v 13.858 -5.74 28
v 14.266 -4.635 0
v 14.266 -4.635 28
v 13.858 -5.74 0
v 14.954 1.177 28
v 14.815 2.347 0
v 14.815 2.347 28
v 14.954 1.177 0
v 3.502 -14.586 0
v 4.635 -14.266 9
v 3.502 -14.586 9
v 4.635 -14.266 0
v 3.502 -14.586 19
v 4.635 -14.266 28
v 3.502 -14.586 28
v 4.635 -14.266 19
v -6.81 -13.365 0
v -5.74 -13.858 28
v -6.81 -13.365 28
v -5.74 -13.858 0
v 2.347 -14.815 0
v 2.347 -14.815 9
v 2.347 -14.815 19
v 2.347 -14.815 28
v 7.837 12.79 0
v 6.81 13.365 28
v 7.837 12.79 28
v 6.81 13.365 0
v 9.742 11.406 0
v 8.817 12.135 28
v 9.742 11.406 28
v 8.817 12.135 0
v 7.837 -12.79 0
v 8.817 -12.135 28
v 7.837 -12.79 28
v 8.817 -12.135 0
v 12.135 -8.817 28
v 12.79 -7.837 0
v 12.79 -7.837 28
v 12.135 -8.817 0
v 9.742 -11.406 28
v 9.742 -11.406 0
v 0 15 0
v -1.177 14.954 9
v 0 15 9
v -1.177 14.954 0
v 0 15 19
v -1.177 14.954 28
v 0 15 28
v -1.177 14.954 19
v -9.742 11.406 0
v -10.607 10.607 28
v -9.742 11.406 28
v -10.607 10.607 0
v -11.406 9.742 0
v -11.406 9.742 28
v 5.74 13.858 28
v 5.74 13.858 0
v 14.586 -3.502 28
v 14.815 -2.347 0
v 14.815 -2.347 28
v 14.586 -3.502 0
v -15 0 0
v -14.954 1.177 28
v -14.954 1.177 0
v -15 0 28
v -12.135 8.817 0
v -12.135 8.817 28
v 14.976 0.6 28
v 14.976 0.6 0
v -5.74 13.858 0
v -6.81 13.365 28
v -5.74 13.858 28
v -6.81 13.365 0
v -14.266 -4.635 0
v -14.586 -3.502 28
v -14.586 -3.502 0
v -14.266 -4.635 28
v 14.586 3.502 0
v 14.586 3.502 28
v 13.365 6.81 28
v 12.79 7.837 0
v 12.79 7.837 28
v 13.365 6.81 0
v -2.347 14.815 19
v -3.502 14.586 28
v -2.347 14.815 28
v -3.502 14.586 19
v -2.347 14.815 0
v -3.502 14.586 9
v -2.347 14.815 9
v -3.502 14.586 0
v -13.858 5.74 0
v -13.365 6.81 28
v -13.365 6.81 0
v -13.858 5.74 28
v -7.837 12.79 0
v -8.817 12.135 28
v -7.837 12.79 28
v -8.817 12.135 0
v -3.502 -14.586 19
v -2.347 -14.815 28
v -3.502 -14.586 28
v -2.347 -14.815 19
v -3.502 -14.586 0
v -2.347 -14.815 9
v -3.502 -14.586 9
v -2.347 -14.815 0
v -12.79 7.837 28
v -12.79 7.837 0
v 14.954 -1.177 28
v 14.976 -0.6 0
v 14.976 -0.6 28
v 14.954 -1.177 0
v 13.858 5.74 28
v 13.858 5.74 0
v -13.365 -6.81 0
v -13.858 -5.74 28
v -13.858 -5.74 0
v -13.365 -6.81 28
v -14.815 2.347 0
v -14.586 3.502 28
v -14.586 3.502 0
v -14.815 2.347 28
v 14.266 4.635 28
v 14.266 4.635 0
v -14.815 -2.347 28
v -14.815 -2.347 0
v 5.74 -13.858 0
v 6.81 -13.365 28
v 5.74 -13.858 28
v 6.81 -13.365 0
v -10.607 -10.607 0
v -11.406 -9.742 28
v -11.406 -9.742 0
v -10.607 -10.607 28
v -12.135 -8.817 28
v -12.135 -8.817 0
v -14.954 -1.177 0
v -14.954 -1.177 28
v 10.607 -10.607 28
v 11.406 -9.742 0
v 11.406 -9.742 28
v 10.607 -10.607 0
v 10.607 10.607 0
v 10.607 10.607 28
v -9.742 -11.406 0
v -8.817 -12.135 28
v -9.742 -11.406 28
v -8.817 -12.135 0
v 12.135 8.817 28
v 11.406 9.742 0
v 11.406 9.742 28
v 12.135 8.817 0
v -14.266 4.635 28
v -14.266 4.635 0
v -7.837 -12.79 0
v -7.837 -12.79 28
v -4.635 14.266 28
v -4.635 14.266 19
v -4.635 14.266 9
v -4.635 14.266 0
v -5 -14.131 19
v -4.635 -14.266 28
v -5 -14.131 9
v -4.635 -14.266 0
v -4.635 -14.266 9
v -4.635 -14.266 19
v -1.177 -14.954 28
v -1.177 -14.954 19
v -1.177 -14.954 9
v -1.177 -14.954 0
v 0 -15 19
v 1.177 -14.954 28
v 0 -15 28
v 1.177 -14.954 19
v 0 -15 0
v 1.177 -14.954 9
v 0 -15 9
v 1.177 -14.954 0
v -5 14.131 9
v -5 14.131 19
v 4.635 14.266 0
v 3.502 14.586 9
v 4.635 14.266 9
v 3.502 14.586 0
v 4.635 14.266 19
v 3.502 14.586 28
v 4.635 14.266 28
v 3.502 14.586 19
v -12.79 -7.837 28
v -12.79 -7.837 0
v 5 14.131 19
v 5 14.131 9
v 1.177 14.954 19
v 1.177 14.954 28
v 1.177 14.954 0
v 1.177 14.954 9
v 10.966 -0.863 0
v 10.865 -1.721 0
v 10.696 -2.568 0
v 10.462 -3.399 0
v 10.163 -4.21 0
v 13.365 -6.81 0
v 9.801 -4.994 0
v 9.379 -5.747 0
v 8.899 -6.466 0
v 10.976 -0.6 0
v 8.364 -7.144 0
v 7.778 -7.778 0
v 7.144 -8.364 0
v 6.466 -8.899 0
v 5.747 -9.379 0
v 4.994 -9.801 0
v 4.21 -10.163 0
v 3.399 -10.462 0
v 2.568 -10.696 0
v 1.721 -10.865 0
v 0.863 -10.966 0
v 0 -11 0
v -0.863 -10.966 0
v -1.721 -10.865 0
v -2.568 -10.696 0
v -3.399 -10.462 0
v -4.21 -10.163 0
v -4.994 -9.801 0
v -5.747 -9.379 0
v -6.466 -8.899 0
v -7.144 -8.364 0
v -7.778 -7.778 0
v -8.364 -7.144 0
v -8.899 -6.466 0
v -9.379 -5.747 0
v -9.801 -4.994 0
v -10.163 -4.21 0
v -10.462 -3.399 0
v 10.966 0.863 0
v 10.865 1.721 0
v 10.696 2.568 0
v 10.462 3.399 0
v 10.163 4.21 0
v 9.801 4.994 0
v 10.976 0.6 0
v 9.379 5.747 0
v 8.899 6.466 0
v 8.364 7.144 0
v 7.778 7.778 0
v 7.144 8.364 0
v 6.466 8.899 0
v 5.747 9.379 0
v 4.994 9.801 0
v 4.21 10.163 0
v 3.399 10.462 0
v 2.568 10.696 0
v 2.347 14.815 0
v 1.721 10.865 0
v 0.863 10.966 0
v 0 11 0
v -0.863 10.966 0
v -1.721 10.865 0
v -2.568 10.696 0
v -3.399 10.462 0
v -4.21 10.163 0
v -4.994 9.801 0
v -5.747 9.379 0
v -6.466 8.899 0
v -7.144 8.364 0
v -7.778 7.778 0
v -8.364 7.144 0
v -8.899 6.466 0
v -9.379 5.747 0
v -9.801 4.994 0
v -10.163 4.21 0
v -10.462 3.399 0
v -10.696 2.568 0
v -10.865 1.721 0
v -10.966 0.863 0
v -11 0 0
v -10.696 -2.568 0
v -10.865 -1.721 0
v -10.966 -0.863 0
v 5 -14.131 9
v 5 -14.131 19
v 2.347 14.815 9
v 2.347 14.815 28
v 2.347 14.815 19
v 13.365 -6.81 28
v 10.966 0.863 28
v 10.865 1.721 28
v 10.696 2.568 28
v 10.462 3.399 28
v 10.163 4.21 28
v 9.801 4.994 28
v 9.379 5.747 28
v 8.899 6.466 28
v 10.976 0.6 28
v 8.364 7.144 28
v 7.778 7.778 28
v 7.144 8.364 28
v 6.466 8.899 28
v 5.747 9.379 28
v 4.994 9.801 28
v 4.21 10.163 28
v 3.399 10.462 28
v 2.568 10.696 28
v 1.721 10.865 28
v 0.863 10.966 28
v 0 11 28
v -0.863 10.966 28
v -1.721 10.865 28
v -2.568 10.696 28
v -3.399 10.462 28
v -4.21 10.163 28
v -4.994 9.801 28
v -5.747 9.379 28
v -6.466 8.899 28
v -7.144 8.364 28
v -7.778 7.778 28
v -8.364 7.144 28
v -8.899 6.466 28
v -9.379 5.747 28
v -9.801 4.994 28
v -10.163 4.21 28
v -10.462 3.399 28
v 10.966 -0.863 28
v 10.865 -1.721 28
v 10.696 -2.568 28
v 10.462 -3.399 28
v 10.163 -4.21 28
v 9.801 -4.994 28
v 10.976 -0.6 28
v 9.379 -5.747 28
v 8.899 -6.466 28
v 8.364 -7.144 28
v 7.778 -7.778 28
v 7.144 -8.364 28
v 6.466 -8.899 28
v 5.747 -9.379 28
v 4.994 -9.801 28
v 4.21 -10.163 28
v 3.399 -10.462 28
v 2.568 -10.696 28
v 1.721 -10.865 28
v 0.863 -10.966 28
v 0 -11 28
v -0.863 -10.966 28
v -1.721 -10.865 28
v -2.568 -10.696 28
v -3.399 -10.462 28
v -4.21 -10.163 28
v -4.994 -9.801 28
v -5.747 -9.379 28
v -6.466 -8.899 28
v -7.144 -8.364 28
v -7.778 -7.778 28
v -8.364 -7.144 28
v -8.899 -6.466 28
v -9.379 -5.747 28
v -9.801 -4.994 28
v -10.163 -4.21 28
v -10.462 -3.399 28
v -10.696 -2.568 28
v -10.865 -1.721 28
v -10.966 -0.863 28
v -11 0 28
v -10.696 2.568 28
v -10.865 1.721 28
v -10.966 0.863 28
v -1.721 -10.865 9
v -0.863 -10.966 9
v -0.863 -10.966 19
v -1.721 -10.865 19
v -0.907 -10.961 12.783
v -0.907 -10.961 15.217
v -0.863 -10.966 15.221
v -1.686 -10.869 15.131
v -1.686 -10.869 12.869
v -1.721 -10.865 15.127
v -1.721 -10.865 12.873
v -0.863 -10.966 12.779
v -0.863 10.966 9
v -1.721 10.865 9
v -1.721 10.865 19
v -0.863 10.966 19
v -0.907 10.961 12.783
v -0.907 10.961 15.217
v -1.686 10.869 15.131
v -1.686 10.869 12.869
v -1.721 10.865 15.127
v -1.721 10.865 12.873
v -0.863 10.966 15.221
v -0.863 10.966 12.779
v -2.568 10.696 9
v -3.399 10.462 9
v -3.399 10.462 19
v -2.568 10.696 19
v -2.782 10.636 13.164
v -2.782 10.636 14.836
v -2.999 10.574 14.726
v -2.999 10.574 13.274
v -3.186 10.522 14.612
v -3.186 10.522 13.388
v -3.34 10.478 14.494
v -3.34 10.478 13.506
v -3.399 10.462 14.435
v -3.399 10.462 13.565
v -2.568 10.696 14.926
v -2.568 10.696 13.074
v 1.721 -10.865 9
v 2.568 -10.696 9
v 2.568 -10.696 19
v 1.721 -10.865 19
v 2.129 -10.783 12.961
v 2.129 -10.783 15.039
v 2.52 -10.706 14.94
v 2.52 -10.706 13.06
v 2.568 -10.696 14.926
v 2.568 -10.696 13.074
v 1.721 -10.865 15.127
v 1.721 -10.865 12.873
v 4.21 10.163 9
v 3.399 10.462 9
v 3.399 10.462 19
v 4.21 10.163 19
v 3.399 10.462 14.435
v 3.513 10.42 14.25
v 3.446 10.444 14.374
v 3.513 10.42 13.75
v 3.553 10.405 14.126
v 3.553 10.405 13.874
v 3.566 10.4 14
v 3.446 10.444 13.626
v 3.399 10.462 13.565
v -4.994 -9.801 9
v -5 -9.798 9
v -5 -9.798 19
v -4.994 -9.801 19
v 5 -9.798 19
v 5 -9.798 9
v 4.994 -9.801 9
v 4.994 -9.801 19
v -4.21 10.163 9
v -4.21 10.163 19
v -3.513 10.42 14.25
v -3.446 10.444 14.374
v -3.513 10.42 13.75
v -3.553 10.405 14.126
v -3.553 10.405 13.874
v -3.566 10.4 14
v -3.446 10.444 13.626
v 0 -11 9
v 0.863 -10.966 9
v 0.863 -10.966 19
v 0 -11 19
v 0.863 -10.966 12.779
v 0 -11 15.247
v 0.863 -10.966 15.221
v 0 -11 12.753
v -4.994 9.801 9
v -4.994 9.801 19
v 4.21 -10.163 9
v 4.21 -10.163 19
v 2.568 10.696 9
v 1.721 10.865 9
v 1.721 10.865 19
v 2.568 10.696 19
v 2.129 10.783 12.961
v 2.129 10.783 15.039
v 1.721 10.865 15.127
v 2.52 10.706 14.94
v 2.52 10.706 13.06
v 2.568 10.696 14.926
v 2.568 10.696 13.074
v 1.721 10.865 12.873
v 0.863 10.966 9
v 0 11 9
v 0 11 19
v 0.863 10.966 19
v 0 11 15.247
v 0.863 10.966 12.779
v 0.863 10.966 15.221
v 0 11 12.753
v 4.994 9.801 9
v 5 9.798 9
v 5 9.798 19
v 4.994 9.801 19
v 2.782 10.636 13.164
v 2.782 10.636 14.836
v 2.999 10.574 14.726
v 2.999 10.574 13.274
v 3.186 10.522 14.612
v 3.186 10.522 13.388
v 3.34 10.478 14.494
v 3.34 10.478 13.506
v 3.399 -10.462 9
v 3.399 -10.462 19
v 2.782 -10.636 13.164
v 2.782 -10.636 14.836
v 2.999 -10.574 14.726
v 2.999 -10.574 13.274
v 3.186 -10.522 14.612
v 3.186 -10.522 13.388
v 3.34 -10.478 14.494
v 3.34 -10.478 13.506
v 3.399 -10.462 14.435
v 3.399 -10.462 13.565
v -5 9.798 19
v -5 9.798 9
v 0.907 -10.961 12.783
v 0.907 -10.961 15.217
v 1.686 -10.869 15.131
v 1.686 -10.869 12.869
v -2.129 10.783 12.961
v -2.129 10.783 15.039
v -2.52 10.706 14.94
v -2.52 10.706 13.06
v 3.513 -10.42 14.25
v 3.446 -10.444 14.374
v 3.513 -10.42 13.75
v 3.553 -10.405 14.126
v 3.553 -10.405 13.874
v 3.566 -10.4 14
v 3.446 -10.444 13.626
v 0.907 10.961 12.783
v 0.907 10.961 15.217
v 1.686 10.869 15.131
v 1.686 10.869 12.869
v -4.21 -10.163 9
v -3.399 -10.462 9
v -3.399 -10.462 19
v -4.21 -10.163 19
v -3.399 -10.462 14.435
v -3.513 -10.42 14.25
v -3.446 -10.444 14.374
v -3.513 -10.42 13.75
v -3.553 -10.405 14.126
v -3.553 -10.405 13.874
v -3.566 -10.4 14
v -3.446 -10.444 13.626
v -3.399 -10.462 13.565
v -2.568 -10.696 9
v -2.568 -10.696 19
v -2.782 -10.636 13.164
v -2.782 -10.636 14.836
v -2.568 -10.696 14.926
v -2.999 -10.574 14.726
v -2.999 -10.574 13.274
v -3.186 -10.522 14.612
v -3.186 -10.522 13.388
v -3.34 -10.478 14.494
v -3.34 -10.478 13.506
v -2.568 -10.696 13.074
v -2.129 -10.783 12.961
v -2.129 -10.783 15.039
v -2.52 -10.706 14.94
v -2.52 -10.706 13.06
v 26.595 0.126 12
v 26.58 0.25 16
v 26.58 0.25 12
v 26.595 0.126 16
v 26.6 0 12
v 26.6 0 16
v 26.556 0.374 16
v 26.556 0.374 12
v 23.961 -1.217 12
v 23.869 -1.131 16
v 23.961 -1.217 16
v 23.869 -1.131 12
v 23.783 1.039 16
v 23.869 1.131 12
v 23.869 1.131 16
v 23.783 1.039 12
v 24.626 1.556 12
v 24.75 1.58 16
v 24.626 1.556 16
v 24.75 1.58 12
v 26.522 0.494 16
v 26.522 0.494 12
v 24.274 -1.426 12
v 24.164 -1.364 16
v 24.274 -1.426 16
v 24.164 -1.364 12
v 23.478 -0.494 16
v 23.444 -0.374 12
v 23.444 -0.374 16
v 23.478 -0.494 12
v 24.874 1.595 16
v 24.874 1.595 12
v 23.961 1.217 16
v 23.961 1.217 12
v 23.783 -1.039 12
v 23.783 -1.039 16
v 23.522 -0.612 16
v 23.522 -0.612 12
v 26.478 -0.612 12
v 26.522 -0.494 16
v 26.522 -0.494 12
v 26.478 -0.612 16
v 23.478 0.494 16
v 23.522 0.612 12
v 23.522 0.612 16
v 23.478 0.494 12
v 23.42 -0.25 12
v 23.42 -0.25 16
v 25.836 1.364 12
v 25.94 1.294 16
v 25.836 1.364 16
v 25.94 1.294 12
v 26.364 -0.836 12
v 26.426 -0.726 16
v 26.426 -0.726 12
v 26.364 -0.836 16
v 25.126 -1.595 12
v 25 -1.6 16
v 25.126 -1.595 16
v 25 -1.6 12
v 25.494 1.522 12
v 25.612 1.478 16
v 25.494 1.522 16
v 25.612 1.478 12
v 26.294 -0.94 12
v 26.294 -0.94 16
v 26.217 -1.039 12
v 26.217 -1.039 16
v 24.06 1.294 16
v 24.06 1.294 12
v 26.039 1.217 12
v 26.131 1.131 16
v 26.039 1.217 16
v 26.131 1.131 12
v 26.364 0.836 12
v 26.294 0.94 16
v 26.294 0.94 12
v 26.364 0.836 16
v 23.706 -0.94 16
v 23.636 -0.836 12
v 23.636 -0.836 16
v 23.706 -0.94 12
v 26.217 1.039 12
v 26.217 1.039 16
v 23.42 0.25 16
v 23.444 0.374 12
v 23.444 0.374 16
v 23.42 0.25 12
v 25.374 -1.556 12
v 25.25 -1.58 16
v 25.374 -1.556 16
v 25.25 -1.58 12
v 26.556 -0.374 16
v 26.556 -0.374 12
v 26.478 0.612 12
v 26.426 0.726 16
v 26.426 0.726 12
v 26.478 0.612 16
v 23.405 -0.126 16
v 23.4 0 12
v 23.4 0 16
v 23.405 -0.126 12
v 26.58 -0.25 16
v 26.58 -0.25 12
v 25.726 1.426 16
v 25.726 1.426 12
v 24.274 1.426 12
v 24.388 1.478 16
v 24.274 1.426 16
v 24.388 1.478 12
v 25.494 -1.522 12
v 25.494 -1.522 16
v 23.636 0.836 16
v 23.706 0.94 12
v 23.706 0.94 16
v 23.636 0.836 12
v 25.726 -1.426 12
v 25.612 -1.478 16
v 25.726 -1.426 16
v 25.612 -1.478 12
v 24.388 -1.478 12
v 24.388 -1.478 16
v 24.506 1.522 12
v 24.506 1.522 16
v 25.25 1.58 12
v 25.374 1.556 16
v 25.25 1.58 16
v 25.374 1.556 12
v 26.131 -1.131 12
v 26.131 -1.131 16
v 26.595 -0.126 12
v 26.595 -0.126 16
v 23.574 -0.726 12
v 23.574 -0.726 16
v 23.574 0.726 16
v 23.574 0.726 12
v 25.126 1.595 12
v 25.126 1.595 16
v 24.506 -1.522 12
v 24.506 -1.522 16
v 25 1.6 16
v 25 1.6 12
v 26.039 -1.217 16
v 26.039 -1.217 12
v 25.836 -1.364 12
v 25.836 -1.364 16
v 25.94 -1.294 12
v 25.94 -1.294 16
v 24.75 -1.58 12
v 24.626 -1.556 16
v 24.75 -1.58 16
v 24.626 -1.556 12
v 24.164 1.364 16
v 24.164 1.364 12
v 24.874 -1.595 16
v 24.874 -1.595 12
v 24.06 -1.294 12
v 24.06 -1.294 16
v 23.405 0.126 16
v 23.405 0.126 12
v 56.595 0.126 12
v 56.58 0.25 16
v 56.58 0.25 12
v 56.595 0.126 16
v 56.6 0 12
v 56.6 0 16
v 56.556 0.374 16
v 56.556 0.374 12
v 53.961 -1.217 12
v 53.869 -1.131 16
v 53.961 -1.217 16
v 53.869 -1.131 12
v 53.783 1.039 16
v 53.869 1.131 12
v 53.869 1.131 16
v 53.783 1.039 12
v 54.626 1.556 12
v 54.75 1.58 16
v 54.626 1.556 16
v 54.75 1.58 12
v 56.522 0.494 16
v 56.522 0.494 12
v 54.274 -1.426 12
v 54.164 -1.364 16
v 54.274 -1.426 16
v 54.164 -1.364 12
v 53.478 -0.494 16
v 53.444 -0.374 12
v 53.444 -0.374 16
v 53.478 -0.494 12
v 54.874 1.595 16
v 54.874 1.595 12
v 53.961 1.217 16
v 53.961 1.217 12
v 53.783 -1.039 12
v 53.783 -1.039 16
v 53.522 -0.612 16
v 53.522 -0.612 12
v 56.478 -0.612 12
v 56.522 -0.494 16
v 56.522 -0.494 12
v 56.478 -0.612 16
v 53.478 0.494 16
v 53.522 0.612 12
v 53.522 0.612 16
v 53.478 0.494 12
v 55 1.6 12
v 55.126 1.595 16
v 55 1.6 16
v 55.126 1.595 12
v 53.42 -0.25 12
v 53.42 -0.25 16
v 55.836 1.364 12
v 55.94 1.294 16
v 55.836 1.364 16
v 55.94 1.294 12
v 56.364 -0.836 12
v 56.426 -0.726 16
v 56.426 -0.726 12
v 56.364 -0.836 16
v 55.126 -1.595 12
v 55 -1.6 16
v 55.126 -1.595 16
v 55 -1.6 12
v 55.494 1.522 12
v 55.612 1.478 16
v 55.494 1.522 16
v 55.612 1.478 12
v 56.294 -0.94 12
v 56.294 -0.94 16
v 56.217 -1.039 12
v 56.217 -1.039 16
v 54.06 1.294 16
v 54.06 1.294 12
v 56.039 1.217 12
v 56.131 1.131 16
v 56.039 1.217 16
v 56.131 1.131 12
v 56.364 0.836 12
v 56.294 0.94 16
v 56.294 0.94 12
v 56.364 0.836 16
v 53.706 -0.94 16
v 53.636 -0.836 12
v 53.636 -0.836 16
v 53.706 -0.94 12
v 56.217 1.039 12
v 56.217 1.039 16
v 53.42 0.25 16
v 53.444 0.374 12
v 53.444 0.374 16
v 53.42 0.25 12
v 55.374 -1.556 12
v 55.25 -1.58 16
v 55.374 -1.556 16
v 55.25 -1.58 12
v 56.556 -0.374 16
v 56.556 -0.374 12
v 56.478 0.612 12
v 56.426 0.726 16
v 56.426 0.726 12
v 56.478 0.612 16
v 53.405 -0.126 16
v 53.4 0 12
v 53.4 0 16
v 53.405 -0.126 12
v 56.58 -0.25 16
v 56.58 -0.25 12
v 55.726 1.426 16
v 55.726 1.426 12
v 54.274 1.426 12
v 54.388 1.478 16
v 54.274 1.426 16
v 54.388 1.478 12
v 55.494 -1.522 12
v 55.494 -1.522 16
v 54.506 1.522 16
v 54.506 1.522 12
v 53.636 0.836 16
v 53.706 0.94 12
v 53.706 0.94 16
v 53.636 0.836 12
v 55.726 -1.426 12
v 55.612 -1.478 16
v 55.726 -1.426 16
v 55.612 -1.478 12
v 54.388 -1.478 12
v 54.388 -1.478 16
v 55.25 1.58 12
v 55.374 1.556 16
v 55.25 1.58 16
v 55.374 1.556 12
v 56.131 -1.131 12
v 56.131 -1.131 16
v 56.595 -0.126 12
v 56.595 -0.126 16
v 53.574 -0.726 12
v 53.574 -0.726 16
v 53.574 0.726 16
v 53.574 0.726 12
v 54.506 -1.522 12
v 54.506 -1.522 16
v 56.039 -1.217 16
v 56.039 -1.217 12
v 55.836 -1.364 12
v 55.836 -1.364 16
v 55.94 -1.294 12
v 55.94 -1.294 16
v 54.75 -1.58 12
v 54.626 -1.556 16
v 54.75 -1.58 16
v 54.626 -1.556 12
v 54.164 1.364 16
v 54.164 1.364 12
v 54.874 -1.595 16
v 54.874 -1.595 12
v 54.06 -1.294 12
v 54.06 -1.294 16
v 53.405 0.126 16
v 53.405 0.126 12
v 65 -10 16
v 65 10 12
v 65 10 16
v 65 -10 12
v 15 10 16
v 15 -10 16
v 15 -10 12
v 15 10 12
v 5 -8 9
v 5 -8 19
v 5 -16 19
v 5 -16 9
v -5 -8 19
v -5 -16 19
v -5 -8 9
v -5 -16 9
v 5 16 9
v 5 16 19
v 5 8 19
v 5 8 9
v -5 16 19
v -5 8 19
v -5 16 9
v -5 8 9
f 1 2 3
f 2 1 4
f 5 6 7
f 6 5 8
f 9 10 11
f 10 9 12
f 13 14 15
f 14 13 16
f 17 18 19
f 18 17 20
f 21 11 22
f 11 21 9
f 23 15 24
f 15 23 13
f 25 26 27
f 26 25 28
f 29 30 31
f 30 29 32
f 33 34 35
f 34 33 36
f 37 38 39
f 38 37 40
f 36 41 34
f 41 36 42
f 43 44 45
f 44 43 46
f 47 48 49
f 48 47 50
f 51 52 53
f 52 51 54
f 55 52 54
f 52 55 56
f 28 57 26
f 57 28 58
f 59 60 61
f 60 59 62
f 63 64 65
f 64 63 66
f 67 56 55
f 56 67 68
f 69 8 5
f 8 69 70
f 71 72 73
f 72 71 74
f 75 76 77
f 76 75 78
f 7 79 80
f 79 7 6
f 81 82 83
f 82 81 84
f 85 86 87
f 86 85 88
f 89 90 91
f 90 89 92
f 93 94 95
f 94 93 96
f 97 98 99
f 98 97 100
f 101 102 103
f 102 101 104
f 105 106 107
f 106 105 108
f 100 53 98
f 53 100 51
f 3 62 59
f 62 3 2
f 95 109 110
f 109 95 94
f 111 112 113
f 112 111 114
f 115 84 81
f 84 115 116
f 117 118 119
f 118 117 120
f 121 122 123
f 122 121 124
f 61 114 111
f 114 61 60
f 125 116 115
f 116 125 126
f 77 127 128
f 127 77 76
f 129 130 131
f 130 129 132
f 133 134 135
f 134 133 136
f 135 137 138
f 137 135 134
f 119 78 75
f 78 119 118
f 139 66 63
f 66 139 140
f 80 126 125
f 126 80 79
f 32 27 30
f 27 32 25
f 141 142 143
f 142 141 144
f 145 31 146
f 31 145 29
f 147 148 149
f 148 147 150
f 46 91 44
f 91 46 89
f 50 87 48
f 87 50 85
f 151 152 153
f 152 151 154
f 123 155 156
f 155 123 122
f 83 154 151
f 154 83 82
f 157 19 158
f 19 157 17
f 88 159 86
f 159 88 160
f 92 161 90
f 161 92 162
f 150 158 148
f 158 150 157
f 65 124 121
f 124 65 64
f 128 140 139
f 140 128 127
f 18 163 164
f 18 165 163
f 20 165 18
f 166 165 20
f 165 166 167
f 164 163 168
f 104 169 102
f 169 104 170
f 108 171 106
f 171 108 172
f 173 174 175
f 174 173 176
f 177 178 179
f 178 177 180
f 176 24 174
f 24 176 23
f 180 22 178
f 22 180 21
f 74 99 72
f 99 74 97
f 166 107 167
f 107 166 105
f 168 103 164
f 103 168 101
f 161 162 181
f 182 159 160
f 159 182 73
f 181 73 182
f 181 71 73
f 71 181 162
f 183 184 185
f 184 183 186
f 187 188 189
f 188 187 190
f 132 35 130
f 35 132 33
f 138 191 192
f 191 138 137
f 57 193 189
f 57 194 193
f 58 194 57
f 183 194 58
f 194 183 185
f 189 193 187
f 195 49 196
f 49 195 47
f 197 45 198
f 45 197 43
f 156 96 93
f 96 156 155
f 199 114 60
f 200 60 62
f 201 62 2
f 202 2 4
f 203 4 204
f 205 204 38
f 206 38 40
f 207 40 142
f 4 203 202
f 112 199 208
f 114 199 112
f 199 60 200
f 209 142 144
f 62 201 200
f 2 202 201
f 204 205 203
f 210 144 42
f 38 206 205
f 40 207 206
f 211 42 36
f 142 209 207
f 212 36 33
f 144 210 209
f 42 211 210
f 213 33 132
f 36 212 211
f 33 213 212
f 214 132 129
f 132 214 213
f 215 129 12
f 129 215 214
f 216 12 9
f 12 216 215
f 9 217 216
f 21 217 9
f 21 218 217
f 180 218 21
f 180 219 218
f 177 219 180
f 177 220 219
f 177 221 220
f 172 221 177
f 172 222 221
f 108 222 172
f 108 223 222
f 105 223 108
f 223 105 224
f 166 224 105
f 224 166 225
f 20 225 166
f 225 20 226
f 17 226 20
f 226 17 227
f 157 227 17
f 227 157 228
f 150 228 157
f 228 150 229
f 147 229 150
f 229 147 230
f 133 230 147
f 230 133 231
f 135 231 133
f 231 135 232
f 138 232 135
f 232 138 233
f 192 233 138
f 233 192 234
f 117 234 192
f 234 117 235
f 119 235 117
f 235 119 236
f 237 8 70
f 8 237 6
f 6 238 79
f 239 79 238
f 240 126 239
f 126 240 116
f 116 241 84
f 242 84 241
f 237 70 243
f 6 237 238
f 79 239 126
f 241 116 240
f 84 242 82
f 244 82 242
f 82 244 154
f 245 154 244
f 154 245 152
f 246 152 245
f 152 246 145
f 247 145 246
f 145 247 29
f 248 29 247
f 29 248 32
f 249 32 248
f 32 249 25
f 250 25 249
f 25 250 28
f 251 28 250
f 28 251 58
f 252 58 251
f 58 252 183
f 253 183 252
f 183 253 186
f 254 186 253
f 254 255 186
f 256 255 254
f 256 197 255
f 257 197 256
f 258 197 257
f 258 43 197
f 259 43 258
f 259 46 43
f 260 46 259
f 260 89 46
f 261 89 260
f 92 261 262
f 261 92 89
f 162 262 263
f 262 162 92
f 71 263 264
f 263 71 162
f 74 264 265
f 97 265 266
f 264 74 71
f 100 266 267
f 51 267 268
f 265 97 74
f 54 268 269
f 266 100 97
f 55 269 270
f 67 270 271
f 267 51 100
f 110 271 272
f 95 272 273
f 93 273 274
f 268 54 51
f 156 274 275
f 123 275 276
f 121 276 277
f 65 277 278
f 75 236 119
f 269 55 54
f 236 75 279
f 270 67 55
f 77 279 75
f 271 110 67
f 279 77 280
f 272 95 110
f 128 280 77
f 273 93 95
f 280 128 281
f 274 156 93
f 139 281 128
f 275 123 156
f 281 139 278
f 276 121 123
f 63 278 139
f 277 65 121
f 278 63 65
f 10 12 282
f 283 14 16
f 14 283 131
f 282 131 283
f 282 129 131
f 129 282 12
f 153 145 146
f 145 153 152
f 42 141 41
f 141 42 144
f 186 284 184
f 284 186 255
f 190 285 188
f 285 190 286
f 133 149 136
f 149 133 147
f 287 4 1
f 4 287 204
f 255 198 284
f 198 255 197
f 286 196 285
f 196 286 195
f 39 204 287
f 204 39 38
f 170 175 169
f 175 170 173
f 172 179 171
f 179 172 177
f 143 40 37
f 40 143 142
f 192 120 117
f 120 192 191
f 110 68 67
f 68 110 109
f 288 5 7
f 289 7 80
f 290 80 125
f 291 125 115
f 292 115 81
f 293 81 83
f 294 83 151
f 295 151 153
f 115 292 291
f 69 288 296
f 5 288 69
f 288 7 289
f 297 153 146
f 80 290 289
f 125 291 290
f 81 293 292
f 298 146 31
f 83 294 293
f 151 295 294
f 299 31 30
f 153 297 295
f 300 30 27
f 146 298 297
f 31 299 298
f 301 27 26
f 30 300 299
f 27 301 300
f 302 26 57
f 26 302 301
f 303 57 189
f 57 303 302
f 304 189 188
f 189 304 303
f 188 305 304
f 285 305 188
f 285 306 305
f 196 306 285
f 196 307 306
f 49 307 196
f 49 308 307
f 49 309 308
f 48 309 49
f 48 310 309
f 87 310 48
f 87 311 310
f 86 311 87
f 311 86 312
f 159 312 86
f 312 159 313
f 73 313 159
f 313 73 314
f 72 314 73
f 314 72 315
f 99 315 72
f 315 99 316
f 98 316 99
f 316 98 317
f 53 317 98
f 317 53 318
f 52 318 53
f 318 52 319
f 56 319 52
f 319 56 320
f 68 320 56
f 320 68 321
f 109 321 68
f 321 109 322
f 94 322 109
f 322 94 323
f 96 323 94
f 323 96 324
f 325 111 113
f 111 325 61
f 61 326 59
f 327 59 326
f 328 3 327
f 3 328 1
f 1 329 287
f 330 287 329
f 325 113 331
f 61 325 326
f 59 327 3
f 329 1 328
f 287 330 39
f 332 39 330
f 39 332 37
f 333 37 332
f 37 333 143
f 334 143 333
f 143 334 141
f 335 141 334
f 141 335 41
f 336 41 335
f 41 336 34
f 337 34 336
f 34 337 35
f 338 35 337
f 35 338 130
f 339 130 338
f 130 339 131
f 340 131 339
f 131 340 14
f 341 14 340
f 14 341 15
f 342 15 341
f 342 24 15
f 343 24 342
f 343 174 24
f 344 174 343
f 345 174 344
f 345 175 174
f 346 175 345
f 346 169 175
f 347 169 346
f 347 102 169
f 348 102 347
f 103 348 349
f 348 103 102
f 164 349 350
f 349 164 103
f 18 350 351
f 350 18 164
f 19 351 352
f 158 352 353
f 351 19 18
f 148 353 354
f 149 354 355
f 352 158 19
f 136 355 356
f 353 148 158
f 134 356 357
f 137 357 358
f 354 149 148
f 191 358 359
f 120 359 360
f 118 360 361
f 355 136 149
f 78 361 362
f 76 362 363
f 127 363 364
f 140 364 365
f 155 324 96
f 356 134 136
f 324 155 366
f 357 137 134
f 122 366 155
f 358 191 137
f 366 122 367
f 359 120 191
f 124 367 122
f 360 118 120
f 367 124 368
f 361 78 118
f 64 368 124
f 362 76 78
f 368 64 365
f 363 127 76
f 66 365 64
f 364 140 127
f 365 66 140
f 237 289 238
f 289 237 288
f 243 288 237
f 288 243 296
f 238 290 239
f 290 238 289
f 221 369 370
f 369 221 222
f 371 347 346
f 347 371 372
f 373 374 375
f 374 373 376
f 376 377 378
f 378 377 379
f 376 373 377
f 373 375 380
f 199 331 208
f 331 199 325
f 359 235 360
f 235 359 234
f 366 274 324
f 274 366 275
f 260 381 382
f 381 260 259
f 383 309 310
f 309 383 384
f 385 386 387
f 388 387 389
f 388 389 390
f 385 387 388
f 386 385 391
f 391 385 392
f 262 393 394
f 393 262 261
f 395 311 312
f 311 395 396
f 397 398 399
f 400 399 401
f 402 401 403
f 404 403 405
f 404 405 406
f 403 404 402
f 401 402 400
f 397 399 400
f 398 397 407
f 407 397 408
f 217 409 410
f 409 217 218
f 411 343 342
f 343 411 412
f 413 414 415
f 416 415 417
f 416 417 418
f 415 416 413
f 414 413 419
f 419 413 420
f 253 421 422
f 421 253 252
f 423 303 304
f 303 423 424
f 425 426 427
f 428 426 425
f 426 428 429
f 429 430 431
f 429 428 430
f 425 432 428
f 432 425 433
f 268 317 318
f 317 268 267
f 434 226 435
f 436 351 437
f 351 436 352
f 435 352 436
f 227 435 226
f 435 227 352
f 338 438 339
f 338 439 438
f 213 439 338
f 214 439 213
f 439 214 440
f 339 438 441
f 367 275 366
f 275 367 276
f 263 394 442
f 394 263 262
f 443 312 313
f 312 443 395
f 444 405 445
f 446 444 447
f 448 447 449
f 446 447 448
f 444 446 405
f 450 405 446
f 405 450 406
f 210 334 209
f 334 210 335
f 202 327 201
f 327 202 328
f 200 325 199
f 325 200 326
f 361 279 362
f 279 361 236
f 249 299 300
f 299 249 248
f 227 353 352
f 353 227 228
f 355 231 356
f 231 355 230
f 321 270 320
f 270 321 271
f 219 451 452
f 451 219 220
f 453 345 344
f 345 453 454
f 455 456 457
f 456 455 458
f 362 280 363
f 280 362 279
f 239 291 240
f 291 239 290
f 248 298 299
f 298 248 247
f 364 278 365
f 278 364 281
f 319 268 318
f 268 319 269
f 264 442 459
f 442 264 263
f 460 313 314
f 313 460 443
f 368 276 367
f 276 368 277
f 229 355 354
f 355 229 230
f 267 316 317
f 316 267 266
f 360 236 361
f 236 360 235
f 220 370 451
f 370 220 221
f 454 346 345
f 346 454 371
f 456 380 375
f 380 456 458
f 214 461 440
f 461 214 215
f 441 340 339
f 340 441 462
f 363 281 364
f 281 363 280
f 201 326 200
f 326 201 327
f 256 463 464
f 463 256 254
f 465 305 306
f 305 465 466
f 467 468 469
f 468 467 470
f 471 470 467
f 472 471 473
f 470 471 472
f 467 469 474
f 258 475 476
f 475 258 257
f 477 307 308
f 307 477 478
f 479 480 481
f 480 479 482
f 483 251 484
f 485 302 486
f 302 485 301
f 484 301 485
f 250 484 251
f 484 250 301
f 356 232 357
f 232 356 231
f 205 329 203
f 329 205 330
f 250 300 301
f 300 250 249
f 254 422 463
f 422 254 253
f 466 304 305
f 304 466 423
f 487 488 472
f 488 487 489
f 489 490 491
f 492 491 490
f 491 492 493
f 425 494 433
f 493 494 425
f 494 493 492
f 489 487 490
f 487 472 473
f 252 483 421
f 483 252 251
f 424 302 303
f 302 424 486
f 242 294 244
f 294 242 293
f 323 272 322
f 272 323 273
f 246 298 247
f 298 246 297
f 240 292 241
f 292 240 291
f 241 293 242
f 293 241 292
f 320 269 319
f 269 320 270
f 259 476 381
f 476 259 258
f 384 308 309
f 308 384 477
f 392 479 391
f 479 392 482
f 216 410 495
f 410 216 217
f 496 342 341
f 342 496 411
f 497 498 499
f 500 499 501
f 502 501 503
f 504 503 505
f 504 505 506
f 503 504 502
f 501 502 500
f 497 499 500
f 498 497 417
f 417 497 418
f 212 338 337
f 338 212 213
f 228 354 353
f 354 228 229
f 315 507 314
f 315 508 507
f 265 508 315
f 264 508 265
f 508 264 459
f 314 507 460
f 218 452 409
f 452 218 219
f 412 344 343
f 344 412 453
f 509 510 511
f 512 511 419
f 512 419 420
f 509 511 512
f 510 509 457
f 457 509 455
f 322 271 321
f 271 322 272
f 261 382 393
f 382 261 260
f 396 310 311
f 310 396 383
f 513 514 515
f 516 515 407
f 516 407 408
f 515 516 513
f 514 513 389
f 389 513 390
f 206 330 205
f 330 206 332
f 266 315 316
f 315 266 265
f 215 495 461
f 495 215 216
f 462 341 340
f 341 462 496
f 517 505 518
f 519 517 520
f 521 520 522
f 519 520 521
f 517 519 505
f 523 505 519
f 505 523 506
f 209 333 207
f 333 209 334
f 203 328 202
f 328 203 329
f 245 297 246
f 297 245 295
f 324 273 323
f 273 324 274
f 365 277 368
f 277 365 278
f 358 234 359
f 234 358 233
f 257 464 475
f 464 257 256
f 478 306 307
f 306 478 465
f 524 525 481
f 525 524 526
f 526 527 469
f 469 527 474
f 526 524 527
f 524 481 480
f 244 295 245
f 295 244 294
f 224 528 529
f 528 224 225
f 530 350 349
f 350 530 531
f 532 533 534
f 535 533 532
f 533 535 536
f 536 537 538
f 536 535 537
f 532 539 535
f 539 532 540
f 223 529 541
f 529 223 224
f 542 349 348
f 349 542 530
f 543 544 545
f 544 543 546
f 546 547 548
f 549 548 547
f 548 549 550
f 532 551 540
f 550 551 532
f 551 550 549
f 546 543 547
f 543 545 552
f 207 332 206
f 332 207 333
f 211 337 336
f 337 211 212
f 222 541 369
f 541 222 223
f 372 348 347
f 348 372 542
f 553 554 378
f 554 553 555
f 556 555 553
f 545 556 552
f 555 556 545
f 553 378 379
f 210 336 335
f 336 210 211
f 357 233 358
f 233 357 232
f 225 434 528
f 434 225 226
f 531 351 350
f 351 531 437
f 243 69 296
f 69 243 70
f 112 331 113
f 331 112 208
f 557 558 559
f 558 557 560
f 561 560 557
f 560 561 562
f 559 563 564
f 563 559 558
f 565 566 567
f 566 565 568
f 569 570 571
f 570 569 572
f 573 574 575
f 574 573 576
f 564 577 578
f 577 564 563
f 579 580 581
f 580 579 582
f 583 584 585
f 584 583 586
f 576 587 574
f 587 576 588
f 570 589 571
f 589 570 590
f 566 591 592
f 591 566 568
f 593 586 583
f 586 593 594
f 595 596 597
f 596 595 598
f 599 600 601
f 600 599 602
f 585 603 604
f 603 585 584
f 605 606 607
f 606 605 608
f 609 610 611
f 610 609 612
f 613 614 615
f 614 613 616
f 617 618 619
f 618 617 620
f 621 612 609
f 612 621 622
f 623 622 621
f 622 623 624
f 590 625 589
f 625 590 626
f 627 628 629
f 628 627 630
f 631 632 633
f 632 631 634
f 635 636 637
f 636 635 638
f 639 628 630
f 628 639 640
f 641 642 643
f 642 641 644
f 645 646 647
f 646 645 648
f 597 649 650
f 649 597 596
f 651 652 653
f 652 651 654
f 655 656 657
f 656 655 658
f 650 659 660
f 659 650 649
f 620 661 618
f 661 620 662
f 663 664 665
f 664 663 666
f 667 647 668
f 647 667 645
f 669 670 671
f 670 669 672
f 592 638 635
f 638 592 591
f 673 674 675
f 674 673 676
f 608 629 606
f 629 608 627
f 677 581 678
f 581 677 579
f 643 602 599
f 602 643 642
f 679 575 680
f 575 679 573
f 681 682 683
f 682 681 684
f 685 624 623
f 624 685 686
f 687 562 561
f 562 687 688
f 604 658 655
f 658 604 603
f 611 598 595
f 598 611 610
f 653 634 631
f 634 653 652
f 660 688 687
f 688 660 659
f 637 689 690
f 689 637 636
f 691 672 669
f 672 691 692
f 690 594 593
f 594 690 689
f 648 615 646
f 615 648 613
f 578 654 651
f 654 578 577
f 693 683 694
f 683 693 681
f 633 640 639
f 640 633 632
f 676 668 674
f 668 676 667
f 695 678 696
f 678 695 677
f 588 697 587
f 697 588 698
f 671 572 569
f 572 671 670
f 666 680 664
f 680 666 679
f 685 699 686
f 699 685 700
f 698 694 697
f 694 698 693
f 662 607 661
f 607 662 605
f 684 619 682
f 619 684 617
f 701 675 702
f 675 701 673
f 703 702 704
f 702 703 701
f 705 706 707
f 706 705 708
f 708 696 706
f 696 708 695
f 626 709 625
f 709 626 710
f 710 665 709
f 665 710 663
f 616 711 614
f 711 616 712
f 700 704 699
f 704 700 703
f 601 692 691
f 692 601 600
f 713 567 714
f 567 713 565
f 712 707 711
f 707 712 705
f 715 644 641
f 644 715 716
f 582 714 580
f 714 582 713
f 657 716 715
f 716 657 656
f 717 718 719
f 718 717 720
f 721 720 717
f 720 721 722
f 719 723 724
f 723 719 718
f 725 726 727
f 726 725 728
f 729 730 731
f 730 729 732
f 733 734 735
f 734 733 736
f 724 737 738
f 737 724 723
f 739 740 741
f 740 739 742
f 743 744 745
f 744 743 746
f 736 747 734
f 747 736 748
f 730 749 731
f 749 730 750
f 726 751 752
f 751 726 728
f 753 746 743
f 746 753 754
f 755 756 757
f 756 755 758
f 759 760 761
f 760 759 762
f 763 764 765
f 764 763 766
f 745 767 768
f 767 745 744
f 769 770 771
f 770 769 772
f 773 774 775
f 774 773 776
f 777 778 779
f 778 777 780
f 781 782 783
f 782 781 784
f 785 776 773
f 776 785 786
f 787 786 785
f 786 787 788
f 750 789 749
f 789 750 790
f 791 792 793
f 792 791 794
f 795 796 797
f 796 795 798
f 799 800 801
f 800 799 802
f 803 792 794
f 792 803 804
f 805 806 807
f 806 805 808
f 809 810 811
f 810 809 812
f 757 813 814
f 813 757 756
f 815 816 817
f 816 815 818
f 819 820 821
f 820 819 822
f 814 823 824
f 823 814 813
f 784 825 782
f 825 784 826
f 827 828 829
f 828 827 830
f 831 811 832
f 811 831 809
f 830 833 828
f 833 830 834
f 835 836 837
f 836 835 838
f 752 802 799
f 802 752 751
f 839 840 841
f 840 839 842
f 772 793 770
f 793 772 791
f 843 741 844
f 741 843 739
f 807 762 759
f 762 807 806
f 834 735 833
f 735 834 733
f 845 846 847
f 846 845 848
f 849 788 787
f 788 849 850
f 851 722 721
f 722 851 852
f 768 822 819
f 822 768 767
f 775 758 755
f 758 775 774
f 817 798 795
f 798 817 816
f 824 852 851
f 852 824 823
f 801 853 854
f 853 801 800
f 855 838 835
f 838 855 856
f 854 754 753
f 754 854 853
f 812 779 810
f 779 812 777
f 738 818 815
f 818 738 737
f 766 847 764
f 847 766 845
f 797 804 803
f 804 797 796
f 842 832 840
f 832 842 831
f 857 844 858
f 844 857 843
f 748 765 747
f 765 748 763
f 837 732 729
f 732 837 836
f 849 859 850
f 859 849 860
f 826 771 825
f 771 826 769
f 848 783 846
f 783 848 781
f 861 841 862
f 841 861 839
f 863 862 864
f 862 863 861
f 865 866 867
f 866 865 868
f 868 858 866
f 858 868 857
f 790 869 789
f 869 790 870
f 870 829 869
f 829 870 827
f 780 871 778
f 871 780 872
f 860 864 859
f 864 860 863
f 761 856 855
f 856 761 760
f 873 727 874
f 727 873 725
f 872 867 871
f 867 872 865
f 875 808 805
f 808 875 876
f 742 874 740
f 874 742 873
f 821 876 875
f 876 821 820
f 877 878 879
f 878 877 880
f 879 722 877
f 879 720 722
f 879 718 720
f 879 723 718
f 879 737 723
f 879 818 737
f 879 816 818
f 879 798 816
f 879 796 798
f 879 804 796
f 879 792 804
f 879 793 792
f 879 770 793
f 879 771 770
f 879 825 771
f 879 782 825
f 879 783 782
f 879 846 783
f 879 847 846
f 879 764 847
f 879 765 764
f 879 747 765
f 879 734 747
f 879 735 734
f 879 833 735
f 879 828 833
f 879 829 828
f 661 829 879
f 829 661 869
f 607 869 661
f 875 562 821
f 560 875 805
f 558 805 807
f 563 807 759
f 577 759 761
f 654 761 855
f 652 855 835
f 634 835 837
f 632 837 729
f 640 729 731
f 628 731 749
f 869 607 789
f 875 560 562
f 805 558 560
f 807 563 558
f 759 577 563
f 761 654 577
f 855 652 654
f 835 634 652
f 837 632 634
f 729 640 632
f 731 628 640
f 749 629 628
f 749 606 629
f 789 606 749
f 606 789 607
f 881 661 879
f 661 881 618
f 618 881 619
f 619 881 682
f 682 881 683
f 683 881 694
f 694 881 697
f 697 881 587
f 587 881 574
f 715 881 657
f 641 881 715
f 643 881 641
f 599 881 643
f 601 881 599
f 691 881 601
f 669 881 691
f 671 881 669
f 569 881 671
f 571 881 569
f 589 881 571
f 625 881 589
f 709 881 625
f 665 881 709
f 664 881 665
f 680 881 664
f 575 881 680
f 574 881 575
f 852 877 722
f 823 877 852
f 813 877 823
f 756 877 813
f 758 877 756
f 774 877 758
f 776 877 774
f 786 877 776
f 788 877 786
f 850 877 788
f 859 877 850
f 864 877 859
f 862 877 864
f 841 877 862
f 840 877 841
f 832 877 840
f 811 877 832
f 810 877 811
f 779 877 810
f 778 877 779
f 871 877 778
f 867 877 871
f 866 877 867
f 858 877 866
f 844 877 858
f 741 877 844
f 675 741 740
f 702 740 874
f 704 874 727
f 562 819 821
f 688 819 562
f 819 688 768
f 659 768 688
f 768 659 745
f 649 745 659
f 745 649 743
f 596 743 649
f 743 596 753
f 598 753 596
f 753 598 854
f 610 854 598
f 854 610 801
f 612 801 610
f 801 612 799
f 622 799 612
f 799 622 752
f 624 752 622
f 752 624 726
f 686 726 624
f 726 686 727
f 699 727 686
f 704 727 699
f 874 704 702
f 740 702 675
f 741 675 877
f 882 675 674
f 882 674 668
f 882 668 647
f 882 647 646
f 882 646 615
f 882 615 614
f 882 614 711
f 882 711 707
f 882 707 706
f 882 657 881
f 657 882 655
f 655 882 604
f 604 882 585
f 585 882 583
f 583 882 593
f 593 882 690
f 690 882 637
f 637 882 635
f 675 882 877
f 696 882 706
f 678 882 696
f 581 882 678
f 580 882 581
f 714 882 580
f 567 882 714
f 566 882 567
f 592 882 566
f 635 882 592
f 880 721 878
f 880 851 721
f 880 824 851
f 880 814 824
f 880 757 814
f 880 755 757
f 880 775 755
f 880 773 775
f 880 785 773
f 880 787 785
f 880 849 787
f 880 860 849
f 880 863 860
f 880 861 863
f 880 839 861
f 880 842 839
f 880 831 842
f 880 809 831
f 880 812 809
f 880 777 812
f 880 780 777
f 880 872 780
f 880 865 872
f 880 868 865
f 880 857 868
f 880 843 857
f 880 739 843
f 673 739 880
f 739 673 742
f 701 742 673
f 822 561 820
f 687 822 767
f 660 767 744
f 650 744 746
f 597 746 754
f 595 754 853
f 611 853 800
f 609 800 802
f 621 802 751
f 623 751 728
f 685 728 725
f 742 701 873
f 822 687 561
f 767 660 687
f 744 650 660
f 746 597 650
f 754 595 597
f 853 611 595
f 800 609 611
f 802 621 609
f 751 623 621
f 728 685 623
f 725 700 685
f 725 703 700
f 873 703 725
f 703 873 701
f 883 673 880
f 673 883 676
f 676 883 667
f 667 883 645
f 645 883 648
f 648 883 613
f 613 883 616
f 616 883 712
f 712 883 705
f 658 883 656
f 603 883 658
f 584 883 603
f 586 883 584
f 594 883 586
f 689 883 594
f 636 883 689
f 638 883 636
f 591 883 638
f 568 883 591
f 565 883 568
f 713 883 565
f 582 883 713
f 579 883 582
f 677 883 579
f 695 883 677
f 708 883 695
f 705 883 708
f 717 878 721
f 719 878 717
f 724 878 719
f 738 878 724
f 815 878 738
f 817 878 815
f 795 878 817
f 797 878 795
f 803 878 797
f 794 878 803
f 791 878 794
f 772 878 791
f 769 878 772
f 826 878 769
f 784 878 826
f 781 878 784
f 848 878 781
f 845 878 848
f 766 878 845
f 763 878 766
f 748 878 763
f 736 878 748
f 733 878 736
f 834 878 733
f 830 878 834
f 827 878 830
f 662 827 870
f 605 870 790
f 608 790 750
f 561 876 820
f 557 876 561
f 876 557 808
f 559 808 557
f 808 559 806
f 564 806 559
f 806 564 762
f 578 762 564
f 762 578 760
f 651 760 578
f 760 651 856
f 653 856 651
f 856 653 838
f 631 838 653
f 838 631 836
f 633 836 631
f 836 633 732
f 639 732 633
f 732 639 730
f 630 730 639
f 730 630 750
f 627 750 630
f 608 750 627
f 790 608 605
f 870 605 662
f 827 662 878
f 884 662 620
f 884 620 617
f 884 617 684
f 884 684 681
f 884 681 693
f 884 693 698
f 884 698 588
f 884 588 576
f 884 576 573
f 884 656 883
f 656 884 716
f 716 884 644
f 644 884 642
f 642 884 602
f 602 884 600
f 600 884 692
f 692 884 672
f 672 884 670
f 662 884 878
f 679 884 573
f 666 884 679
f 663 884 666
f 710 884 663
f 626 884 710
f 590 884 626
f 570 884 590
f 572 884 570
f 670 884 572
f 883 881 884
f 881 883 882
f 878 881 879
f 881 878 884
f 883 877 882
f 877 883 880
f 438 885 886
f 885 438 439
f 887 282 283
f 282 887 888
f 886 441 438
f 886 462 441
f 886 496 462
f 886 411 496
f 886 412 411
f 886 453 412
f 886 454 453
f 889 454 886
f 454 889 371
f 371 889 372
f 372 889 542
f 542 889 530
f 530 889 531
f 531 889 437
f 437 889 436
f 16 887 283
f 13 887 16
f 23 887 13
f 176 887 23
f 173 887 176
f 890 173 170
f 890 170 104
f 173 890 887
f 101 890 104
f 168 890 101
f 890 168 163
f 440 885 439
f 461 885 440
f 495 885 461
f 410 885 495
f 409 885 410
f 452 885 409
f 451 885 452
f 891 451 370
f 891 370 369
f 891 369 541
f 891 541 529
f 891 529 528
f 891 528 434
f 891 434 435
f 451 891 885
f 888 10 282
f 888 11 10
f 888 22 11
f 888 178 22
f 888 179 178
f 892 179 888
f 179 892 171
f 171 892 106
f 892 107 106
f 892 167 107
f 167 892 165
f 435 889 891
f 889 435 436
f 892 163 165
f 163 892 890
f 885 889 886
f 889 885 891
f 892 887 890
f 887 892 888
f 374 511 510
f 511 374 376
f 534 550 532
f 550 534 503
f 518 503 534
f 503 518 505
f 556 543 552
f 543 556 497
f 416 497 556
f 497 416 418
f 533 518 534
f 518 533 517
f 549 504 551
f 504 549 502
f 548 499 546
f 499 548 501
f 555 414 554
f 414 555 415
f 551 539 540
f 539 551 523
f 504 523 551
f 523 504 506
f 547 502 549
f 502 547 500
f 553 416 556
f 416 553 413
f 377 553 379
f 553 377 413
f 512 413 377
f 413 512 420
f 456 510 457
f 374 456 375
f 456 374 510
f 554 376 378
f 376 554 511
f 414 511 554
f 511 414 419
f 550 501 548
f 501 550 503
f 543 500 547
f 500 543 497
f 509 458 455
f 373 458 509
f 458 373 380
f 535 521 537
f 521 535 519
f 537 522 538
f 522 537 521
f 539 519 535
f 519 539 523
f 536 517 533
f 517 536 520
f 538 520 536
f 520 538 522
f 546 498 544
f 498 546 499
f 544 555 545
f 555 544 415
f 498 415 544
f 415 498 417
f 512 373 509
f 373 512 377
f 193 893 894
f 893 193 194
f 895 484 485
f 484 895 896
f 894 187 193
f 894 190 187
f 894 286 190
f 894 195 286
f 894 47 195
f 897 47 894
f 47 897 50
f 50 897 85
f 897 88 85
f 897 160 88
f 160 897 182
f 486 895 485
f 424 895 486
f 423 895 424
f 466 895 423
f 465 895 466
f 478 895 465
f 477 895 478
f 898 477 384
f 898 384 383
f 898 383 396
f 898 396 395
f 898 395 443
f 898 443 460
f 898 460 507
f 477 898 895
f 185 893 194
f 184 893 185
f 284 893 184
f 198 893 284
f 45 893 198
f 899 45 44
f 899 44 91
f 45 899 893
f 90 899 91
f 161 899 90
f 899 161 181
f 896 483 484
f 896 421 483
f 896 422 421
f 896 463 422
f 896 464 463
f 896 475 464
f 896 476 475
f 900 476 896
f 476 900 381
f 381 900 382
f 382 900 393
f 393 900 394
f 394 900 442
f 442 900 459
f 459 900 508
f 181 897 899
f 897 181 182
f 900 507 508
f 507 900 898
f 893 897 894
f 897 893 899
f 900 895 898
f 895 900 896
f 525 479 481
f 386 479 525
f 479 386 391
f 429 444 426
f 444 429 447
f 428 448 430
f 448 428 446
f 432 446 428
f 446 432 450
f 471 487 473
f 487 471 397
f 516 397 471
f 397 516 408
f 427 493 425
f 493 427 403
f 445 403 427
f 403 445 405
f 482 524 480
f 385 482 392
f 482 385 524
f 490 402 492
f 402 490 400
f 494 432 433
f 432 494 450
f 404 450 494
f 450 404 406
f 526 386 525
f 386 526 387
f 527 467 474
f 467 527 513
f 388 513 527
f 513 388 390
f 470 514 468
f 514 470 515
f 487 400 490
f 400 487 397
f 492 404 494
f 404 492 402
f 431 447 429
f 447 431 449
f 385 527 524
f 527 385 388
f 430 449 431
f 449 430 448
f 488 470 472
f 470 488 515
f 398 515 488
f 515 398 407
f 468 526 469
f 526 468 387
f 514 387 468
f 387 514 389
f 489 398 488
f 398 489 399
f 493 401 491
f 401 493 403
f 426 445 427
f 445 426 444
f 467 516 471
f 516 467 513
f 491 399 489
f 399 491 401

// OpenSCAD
// NestWeaver — camera mast clamp for RealSense-class cameras

/* [Mast] */
mast_od = 22;
clamp_gap = 1.2;
wall = 4;
height = 28;
camera_plate_w = 50;
camera_plate_d = 20;
camera_plate_t = 4;
hole_spacing = 30;
hole_d = 3.2;

$fn = 80;

module clamp_body() {
  difference() {
    cylinder(h=height, d=mast_od + 2*wall);
    translate([0, 0, -0.1])
      cylinder(h=height + 0.2, d=mast_od);
    translate([0, -clamp_gap/2, -0.1])
      cube([mast_od, clamp_gap, height + 0.2]);
  }
}

union() {
  clamp_body();
  translate([mast_od/2 + wall, -camera_plate_d/2, height/2 - camera_plate_t/2])
    difference() {
      cube([camera_plate_w, camera_plate_d, camera_plate_t]);
      for (x = [10, 10 + hole_spacing])
        translate([x, camera_plate_d/2, -0.1])
          cylinder(h=camera_plate_t + 0.2, d=hole_d);
    }
  // pinch bolt ears
  for (y = [-12, 12])
    translate([0, y, height/2])
      difference() {
        cube([10, 8, 10], center=true);
        rotate([0, 90, 0])
          cylinder(h=12, d=3.2, center=true);
      }
}
